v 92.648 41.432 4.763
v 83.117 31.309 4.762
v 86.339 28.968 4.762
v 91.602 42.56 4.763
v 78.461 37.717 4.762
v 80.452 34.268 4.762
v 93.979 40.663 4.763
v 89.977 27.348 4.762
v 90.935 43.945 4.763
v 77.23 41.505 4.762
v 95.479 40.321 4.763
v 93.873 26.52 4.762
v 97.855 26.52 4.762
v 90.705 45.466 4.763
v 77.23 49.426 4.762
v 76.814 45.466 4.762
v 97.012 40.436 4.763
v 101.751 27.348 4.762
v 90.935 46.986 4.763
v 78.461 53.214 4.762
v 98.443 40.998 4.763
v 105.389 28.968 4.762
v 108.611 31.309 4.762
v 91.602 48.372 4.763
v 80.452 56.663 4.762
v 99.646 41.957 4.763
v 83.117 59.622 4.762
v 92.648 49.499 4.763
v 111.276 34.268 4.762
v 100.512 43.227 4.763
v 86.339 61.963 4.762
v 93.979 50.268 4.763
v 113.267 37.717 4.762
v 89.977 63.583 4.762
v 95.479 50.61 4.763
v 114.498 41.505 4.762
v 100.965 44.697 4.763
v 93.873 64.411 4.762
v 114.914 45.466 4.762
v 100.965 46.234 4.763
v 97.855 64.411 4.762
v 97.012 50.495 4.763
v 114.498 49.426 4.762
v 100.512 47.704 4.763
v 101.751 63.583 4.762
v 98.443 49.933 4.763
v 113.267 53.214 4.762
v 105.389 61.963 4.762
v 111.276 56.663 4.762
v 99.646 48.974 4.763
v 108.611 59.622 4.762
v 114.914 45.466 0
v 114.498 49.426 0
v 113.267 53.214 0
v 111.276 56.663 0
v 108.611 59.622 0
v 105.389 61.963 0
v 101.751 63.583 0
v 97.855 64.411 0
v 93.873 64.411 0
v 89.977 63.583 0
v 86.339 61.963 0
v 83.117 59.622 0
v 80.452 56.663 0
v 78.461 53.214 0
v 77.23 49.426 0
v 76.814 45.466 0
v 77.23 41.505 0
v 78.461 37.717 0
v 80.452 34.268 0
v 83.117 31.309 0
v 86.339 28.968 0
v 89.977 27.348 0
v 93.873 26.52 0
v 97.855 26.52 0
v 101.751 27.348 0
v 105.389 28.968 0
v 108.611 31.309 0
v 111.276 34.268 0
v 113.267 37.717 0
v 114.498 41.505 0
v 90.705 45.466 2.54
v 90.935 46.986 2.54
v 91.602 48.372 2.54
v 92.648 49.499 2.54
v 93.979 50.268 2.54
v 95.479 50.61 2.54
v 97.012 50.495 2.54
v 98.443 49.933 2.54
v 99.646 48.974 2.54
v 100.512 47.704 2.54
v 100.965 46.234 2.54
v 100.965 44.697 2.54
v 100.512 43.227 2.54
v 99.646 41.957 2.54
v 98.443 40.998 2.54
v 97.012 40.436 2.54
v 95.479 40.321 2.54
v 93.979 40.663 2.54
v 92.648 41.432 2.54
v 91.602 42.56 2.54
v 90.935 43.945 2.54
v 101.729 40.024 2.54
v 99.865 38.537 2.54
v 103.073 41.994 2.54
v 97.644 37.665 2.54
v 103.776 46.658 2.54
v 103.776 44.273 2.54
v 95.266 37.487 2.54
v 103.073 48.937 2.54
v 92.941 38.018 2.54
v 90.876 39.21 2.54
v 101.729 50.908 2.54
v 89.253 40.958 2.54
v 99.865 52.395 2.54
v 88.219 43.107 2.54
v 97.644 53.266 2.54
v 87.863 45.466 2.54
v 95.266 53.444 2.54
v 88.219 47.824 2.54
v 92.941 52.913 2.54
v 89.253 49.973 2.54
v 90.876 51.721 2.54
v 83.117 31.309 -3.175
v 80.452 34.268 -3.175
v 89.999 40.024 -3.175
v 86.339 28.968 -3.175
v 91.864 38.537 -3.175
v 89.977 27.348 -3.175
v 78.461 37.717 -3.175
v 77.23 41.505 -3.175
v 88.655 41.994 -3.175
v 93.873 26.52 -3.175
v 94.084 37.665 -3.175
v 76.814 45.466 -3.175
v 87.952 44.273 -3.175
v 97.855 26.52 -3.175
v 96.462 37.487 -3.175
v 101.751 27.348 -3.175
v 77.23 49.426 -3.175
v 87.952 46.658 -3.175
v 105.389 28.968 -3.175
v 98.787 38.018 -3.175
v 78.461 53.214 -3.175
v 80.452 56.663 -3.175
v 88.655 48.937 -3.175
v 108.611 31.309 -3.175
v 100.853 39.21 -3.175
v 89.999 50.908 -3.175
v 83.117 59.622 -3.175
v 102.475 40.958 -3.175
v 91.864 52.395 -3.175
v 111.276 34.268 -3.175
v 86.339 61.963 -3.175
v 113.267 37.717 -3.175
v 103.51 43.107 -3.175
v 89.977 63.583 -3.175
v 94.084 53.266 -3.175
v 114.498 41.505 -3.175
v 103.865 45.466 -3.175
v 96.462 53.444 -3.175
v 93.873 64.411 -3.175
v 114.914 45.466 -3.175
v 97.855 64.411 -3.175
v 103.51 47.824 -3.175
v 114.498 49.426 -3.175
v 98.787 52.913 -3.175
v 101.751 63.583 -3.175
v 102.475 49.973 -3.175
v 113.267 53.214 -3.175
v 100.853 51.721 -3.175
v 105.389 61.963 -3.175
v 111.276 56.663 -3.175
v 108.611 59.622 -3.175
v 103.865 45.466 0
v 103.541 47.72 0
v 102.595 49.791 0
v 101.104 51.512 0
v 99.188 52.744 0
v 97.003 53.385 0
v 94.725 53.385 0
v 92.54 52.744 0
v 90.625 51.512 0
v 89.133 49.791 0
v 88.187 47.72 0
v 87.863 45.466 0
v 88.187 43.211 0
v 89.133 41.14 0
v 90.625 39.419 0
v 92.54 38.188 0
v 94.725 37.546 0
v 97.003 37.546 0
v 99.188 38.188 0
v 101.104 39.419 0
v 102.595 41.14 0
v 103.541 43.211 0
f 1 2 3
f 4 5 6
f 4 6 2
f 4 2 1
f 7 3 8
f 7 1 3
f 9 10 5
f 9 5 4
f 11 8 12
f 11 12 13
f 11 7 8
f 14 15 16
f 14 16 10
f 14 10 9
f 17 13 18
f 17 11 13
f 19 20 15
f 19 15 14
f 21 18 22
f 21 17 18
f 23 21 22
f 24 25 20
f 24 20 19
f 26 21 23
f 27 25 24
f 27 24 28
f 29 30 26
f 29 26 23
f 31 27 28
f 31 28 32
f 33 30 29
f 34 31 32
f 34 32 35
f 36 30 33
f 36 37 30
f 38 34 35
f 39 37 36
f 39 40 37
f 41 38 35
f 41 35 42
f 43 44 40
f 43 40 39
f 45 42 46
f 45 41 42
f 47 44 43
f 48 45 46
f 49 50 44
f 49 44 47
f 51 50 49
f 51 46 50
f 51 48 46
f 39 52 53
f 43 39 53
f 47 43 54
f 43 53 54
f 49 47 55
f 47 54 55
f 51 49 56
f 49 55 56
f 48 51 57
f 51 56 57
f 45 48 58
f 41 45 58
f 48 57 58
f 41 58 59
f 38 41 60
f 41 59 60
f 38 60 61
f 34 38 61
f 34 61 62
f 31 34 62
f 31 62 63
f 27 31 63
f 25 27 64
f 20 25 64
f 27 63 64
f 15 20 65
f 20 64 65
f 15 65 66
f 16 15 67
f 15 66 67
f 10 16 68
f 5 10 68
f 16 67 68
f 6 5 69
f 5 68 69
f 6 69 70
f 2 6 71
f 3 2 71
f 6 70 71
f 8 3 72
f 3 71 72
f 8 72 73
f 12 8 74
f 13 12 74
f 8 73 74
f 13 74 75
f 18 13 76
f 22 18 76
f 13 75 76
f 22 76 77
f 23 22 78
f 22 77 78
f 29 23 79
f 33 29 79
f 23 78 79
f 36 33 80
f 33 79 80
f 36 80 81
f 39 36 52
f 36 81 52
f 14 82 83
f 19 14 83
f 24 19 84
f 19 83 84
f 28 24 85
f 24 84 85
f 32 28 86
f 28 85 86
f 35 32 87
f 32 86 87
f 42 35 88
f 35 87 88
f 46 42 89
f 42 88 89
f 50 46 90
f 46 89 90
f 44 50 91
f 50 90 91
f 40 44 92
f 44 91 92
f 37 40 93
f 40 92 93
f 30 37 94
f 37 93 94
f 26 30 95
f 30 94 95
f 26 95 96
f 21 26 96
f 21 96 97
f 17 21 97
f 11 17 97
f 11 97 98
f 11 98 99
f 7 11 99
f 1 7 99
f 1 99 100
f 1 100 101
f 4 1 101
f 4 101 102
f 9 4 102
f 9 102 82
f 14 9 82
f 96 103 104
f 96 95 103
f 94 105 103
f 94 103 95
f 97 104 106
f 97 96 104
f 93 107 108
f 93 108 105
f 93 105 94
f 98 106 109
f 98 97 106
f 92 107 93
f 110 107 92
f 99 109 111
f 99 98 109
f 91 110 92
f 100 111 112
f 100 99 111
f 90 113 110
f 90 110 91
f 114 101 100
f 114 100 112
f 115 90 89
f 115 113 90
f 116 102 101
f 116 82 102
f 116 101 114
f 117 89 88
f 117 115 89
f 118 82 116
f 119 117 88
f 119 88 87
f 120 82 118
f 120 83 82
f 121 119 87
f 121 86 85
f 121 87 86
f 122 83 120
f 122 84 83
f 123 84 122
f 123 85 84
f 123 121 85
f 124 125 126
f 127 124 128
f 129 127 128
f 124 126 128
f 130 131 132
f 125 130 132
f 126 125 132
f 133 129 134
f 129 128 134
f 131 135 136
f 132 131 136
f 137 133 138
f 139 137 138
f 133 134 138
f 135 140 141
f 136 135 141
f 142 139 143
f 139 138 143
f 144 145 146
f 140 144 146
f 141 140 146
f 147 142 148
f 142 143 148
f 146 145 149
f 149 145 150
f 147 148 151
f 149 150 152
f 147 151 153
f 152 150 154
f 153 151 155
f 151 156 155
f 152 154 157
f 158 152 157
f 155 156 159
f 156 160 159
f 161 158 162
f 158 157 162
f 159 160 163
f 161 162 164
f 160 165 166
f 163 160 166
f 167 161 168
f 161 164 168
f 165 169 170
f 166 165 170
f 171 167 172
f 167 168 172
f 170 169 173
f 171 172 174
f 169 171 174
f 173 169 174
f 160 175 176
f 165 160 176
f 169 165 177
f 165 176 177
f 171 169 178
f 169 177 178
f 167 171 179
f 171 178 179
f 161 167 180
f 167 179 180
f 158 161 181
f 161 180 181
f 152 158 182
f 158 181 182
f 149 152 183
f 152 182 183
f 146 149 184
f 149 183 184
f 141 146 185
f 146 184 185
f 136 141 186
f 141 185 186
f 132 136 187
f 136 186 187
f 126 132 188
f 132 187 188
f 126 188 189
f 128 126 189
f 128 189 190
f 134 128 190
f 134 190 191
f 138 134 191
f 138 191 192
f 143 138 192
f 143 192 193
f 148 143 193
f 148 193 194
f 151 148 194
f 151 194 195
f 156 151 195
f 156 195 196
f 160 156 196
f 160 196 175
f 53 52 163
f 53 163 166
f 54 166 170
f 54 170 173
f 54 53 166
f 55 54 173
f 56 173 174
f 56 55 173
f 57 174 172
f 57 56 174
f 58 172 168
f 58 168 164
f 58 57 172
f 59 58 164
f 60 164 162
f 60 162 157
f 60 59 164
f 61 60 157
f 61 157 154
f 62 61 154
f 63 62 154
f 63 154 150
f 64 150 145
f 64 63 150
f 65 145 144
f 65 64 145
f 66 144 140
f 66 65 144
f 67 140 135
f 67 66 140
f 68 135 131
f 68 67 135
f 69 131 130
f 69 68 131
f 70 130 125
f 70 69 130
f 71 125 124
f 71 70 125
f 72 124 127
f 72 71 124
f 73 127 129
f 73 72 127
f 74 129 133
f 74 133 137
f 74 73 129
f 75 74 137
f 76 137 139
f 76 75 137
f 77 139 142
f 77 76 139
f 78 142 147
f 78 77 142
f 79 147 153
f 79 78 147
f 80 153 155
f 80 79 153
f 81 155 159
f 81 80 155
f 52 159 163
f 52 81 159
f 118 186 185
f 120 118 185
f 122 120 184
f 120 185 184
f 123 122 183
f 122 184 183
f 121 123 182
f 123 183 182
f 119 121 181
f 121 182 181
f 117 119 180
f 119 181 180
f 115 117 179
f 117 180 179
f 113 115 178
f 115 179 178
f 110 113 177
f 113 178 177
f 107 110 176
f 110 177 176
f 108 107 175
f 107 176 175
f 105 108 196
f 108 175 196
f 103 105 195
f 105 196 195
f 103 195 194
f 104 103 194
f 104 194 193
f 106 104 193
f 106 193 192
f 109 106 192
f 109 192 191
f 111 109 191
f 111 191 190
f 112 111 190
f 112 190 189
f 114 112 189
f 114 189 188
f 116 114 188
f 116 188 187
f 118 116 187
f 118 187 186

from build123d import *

# Parameters (mm, degrees)
SKETCH1_R               = 19.05
SKETCH1_R_2             = 8.001
BOSS_EXTRUDE1_DEPTH     = 3.175
SKETCH2_R               = 19.05
BOSS_EXTRUDE2_DEPTH     = 4.7625
F_3_8_CLEARANCE_HOLE1_D = 10.31748
SKETCH6_R               = 8.001
CUT_EXTRUDE1_DEPTH      = 2.54


with BuildPart() as part:
    # Sketch1 → Boss-Extrude1 (new body)
    with BuildSketch(Plane.XY):
        with Locations((95.864074702, 45.465579041)):
            Circle(SKETCH1_R)
        with Locations((95.864074702, 45.465579041)):
            Circle(SKETCH1_R_2, mode=Mode.SUBTRACT)
    extrude(amount=-BOSS_EXTRUDE1_DEPTH)

    # Sketch2 → Boss-Extrude2 (add)
    with BuildSketch(Plane.XY):
        with Locations((95.864074702, 45.465579041)):
            Circle(SKETCH2_R)
    extrude(amount=BOSS_EXTRUDE2_DEPTH)

    # 3/8 Clearance Hole1 (through all)
    with Locations(Plane.XY.offset(4.7625)):
        with Locations((95.864074702, 45.465579041)):
            Hole(F_3_8_CLEARANCE_HOLE1_D / 2)

    # Sketch6 → Cut-Extrude1 (cut)
    with BuildSketch(Plane(origin=(0, 0, 0), x_dir=(-1, 0, 0), z_dir=(0, 0, -1))):
        with Locations((-95.864074702, 45.465579041)):
            Circle(SKETCH6_R)
    extrude(amount=-CUT_EXTRUDE1_DEPTH, mode=Mode.SUBTRACT)


solid = part.part
